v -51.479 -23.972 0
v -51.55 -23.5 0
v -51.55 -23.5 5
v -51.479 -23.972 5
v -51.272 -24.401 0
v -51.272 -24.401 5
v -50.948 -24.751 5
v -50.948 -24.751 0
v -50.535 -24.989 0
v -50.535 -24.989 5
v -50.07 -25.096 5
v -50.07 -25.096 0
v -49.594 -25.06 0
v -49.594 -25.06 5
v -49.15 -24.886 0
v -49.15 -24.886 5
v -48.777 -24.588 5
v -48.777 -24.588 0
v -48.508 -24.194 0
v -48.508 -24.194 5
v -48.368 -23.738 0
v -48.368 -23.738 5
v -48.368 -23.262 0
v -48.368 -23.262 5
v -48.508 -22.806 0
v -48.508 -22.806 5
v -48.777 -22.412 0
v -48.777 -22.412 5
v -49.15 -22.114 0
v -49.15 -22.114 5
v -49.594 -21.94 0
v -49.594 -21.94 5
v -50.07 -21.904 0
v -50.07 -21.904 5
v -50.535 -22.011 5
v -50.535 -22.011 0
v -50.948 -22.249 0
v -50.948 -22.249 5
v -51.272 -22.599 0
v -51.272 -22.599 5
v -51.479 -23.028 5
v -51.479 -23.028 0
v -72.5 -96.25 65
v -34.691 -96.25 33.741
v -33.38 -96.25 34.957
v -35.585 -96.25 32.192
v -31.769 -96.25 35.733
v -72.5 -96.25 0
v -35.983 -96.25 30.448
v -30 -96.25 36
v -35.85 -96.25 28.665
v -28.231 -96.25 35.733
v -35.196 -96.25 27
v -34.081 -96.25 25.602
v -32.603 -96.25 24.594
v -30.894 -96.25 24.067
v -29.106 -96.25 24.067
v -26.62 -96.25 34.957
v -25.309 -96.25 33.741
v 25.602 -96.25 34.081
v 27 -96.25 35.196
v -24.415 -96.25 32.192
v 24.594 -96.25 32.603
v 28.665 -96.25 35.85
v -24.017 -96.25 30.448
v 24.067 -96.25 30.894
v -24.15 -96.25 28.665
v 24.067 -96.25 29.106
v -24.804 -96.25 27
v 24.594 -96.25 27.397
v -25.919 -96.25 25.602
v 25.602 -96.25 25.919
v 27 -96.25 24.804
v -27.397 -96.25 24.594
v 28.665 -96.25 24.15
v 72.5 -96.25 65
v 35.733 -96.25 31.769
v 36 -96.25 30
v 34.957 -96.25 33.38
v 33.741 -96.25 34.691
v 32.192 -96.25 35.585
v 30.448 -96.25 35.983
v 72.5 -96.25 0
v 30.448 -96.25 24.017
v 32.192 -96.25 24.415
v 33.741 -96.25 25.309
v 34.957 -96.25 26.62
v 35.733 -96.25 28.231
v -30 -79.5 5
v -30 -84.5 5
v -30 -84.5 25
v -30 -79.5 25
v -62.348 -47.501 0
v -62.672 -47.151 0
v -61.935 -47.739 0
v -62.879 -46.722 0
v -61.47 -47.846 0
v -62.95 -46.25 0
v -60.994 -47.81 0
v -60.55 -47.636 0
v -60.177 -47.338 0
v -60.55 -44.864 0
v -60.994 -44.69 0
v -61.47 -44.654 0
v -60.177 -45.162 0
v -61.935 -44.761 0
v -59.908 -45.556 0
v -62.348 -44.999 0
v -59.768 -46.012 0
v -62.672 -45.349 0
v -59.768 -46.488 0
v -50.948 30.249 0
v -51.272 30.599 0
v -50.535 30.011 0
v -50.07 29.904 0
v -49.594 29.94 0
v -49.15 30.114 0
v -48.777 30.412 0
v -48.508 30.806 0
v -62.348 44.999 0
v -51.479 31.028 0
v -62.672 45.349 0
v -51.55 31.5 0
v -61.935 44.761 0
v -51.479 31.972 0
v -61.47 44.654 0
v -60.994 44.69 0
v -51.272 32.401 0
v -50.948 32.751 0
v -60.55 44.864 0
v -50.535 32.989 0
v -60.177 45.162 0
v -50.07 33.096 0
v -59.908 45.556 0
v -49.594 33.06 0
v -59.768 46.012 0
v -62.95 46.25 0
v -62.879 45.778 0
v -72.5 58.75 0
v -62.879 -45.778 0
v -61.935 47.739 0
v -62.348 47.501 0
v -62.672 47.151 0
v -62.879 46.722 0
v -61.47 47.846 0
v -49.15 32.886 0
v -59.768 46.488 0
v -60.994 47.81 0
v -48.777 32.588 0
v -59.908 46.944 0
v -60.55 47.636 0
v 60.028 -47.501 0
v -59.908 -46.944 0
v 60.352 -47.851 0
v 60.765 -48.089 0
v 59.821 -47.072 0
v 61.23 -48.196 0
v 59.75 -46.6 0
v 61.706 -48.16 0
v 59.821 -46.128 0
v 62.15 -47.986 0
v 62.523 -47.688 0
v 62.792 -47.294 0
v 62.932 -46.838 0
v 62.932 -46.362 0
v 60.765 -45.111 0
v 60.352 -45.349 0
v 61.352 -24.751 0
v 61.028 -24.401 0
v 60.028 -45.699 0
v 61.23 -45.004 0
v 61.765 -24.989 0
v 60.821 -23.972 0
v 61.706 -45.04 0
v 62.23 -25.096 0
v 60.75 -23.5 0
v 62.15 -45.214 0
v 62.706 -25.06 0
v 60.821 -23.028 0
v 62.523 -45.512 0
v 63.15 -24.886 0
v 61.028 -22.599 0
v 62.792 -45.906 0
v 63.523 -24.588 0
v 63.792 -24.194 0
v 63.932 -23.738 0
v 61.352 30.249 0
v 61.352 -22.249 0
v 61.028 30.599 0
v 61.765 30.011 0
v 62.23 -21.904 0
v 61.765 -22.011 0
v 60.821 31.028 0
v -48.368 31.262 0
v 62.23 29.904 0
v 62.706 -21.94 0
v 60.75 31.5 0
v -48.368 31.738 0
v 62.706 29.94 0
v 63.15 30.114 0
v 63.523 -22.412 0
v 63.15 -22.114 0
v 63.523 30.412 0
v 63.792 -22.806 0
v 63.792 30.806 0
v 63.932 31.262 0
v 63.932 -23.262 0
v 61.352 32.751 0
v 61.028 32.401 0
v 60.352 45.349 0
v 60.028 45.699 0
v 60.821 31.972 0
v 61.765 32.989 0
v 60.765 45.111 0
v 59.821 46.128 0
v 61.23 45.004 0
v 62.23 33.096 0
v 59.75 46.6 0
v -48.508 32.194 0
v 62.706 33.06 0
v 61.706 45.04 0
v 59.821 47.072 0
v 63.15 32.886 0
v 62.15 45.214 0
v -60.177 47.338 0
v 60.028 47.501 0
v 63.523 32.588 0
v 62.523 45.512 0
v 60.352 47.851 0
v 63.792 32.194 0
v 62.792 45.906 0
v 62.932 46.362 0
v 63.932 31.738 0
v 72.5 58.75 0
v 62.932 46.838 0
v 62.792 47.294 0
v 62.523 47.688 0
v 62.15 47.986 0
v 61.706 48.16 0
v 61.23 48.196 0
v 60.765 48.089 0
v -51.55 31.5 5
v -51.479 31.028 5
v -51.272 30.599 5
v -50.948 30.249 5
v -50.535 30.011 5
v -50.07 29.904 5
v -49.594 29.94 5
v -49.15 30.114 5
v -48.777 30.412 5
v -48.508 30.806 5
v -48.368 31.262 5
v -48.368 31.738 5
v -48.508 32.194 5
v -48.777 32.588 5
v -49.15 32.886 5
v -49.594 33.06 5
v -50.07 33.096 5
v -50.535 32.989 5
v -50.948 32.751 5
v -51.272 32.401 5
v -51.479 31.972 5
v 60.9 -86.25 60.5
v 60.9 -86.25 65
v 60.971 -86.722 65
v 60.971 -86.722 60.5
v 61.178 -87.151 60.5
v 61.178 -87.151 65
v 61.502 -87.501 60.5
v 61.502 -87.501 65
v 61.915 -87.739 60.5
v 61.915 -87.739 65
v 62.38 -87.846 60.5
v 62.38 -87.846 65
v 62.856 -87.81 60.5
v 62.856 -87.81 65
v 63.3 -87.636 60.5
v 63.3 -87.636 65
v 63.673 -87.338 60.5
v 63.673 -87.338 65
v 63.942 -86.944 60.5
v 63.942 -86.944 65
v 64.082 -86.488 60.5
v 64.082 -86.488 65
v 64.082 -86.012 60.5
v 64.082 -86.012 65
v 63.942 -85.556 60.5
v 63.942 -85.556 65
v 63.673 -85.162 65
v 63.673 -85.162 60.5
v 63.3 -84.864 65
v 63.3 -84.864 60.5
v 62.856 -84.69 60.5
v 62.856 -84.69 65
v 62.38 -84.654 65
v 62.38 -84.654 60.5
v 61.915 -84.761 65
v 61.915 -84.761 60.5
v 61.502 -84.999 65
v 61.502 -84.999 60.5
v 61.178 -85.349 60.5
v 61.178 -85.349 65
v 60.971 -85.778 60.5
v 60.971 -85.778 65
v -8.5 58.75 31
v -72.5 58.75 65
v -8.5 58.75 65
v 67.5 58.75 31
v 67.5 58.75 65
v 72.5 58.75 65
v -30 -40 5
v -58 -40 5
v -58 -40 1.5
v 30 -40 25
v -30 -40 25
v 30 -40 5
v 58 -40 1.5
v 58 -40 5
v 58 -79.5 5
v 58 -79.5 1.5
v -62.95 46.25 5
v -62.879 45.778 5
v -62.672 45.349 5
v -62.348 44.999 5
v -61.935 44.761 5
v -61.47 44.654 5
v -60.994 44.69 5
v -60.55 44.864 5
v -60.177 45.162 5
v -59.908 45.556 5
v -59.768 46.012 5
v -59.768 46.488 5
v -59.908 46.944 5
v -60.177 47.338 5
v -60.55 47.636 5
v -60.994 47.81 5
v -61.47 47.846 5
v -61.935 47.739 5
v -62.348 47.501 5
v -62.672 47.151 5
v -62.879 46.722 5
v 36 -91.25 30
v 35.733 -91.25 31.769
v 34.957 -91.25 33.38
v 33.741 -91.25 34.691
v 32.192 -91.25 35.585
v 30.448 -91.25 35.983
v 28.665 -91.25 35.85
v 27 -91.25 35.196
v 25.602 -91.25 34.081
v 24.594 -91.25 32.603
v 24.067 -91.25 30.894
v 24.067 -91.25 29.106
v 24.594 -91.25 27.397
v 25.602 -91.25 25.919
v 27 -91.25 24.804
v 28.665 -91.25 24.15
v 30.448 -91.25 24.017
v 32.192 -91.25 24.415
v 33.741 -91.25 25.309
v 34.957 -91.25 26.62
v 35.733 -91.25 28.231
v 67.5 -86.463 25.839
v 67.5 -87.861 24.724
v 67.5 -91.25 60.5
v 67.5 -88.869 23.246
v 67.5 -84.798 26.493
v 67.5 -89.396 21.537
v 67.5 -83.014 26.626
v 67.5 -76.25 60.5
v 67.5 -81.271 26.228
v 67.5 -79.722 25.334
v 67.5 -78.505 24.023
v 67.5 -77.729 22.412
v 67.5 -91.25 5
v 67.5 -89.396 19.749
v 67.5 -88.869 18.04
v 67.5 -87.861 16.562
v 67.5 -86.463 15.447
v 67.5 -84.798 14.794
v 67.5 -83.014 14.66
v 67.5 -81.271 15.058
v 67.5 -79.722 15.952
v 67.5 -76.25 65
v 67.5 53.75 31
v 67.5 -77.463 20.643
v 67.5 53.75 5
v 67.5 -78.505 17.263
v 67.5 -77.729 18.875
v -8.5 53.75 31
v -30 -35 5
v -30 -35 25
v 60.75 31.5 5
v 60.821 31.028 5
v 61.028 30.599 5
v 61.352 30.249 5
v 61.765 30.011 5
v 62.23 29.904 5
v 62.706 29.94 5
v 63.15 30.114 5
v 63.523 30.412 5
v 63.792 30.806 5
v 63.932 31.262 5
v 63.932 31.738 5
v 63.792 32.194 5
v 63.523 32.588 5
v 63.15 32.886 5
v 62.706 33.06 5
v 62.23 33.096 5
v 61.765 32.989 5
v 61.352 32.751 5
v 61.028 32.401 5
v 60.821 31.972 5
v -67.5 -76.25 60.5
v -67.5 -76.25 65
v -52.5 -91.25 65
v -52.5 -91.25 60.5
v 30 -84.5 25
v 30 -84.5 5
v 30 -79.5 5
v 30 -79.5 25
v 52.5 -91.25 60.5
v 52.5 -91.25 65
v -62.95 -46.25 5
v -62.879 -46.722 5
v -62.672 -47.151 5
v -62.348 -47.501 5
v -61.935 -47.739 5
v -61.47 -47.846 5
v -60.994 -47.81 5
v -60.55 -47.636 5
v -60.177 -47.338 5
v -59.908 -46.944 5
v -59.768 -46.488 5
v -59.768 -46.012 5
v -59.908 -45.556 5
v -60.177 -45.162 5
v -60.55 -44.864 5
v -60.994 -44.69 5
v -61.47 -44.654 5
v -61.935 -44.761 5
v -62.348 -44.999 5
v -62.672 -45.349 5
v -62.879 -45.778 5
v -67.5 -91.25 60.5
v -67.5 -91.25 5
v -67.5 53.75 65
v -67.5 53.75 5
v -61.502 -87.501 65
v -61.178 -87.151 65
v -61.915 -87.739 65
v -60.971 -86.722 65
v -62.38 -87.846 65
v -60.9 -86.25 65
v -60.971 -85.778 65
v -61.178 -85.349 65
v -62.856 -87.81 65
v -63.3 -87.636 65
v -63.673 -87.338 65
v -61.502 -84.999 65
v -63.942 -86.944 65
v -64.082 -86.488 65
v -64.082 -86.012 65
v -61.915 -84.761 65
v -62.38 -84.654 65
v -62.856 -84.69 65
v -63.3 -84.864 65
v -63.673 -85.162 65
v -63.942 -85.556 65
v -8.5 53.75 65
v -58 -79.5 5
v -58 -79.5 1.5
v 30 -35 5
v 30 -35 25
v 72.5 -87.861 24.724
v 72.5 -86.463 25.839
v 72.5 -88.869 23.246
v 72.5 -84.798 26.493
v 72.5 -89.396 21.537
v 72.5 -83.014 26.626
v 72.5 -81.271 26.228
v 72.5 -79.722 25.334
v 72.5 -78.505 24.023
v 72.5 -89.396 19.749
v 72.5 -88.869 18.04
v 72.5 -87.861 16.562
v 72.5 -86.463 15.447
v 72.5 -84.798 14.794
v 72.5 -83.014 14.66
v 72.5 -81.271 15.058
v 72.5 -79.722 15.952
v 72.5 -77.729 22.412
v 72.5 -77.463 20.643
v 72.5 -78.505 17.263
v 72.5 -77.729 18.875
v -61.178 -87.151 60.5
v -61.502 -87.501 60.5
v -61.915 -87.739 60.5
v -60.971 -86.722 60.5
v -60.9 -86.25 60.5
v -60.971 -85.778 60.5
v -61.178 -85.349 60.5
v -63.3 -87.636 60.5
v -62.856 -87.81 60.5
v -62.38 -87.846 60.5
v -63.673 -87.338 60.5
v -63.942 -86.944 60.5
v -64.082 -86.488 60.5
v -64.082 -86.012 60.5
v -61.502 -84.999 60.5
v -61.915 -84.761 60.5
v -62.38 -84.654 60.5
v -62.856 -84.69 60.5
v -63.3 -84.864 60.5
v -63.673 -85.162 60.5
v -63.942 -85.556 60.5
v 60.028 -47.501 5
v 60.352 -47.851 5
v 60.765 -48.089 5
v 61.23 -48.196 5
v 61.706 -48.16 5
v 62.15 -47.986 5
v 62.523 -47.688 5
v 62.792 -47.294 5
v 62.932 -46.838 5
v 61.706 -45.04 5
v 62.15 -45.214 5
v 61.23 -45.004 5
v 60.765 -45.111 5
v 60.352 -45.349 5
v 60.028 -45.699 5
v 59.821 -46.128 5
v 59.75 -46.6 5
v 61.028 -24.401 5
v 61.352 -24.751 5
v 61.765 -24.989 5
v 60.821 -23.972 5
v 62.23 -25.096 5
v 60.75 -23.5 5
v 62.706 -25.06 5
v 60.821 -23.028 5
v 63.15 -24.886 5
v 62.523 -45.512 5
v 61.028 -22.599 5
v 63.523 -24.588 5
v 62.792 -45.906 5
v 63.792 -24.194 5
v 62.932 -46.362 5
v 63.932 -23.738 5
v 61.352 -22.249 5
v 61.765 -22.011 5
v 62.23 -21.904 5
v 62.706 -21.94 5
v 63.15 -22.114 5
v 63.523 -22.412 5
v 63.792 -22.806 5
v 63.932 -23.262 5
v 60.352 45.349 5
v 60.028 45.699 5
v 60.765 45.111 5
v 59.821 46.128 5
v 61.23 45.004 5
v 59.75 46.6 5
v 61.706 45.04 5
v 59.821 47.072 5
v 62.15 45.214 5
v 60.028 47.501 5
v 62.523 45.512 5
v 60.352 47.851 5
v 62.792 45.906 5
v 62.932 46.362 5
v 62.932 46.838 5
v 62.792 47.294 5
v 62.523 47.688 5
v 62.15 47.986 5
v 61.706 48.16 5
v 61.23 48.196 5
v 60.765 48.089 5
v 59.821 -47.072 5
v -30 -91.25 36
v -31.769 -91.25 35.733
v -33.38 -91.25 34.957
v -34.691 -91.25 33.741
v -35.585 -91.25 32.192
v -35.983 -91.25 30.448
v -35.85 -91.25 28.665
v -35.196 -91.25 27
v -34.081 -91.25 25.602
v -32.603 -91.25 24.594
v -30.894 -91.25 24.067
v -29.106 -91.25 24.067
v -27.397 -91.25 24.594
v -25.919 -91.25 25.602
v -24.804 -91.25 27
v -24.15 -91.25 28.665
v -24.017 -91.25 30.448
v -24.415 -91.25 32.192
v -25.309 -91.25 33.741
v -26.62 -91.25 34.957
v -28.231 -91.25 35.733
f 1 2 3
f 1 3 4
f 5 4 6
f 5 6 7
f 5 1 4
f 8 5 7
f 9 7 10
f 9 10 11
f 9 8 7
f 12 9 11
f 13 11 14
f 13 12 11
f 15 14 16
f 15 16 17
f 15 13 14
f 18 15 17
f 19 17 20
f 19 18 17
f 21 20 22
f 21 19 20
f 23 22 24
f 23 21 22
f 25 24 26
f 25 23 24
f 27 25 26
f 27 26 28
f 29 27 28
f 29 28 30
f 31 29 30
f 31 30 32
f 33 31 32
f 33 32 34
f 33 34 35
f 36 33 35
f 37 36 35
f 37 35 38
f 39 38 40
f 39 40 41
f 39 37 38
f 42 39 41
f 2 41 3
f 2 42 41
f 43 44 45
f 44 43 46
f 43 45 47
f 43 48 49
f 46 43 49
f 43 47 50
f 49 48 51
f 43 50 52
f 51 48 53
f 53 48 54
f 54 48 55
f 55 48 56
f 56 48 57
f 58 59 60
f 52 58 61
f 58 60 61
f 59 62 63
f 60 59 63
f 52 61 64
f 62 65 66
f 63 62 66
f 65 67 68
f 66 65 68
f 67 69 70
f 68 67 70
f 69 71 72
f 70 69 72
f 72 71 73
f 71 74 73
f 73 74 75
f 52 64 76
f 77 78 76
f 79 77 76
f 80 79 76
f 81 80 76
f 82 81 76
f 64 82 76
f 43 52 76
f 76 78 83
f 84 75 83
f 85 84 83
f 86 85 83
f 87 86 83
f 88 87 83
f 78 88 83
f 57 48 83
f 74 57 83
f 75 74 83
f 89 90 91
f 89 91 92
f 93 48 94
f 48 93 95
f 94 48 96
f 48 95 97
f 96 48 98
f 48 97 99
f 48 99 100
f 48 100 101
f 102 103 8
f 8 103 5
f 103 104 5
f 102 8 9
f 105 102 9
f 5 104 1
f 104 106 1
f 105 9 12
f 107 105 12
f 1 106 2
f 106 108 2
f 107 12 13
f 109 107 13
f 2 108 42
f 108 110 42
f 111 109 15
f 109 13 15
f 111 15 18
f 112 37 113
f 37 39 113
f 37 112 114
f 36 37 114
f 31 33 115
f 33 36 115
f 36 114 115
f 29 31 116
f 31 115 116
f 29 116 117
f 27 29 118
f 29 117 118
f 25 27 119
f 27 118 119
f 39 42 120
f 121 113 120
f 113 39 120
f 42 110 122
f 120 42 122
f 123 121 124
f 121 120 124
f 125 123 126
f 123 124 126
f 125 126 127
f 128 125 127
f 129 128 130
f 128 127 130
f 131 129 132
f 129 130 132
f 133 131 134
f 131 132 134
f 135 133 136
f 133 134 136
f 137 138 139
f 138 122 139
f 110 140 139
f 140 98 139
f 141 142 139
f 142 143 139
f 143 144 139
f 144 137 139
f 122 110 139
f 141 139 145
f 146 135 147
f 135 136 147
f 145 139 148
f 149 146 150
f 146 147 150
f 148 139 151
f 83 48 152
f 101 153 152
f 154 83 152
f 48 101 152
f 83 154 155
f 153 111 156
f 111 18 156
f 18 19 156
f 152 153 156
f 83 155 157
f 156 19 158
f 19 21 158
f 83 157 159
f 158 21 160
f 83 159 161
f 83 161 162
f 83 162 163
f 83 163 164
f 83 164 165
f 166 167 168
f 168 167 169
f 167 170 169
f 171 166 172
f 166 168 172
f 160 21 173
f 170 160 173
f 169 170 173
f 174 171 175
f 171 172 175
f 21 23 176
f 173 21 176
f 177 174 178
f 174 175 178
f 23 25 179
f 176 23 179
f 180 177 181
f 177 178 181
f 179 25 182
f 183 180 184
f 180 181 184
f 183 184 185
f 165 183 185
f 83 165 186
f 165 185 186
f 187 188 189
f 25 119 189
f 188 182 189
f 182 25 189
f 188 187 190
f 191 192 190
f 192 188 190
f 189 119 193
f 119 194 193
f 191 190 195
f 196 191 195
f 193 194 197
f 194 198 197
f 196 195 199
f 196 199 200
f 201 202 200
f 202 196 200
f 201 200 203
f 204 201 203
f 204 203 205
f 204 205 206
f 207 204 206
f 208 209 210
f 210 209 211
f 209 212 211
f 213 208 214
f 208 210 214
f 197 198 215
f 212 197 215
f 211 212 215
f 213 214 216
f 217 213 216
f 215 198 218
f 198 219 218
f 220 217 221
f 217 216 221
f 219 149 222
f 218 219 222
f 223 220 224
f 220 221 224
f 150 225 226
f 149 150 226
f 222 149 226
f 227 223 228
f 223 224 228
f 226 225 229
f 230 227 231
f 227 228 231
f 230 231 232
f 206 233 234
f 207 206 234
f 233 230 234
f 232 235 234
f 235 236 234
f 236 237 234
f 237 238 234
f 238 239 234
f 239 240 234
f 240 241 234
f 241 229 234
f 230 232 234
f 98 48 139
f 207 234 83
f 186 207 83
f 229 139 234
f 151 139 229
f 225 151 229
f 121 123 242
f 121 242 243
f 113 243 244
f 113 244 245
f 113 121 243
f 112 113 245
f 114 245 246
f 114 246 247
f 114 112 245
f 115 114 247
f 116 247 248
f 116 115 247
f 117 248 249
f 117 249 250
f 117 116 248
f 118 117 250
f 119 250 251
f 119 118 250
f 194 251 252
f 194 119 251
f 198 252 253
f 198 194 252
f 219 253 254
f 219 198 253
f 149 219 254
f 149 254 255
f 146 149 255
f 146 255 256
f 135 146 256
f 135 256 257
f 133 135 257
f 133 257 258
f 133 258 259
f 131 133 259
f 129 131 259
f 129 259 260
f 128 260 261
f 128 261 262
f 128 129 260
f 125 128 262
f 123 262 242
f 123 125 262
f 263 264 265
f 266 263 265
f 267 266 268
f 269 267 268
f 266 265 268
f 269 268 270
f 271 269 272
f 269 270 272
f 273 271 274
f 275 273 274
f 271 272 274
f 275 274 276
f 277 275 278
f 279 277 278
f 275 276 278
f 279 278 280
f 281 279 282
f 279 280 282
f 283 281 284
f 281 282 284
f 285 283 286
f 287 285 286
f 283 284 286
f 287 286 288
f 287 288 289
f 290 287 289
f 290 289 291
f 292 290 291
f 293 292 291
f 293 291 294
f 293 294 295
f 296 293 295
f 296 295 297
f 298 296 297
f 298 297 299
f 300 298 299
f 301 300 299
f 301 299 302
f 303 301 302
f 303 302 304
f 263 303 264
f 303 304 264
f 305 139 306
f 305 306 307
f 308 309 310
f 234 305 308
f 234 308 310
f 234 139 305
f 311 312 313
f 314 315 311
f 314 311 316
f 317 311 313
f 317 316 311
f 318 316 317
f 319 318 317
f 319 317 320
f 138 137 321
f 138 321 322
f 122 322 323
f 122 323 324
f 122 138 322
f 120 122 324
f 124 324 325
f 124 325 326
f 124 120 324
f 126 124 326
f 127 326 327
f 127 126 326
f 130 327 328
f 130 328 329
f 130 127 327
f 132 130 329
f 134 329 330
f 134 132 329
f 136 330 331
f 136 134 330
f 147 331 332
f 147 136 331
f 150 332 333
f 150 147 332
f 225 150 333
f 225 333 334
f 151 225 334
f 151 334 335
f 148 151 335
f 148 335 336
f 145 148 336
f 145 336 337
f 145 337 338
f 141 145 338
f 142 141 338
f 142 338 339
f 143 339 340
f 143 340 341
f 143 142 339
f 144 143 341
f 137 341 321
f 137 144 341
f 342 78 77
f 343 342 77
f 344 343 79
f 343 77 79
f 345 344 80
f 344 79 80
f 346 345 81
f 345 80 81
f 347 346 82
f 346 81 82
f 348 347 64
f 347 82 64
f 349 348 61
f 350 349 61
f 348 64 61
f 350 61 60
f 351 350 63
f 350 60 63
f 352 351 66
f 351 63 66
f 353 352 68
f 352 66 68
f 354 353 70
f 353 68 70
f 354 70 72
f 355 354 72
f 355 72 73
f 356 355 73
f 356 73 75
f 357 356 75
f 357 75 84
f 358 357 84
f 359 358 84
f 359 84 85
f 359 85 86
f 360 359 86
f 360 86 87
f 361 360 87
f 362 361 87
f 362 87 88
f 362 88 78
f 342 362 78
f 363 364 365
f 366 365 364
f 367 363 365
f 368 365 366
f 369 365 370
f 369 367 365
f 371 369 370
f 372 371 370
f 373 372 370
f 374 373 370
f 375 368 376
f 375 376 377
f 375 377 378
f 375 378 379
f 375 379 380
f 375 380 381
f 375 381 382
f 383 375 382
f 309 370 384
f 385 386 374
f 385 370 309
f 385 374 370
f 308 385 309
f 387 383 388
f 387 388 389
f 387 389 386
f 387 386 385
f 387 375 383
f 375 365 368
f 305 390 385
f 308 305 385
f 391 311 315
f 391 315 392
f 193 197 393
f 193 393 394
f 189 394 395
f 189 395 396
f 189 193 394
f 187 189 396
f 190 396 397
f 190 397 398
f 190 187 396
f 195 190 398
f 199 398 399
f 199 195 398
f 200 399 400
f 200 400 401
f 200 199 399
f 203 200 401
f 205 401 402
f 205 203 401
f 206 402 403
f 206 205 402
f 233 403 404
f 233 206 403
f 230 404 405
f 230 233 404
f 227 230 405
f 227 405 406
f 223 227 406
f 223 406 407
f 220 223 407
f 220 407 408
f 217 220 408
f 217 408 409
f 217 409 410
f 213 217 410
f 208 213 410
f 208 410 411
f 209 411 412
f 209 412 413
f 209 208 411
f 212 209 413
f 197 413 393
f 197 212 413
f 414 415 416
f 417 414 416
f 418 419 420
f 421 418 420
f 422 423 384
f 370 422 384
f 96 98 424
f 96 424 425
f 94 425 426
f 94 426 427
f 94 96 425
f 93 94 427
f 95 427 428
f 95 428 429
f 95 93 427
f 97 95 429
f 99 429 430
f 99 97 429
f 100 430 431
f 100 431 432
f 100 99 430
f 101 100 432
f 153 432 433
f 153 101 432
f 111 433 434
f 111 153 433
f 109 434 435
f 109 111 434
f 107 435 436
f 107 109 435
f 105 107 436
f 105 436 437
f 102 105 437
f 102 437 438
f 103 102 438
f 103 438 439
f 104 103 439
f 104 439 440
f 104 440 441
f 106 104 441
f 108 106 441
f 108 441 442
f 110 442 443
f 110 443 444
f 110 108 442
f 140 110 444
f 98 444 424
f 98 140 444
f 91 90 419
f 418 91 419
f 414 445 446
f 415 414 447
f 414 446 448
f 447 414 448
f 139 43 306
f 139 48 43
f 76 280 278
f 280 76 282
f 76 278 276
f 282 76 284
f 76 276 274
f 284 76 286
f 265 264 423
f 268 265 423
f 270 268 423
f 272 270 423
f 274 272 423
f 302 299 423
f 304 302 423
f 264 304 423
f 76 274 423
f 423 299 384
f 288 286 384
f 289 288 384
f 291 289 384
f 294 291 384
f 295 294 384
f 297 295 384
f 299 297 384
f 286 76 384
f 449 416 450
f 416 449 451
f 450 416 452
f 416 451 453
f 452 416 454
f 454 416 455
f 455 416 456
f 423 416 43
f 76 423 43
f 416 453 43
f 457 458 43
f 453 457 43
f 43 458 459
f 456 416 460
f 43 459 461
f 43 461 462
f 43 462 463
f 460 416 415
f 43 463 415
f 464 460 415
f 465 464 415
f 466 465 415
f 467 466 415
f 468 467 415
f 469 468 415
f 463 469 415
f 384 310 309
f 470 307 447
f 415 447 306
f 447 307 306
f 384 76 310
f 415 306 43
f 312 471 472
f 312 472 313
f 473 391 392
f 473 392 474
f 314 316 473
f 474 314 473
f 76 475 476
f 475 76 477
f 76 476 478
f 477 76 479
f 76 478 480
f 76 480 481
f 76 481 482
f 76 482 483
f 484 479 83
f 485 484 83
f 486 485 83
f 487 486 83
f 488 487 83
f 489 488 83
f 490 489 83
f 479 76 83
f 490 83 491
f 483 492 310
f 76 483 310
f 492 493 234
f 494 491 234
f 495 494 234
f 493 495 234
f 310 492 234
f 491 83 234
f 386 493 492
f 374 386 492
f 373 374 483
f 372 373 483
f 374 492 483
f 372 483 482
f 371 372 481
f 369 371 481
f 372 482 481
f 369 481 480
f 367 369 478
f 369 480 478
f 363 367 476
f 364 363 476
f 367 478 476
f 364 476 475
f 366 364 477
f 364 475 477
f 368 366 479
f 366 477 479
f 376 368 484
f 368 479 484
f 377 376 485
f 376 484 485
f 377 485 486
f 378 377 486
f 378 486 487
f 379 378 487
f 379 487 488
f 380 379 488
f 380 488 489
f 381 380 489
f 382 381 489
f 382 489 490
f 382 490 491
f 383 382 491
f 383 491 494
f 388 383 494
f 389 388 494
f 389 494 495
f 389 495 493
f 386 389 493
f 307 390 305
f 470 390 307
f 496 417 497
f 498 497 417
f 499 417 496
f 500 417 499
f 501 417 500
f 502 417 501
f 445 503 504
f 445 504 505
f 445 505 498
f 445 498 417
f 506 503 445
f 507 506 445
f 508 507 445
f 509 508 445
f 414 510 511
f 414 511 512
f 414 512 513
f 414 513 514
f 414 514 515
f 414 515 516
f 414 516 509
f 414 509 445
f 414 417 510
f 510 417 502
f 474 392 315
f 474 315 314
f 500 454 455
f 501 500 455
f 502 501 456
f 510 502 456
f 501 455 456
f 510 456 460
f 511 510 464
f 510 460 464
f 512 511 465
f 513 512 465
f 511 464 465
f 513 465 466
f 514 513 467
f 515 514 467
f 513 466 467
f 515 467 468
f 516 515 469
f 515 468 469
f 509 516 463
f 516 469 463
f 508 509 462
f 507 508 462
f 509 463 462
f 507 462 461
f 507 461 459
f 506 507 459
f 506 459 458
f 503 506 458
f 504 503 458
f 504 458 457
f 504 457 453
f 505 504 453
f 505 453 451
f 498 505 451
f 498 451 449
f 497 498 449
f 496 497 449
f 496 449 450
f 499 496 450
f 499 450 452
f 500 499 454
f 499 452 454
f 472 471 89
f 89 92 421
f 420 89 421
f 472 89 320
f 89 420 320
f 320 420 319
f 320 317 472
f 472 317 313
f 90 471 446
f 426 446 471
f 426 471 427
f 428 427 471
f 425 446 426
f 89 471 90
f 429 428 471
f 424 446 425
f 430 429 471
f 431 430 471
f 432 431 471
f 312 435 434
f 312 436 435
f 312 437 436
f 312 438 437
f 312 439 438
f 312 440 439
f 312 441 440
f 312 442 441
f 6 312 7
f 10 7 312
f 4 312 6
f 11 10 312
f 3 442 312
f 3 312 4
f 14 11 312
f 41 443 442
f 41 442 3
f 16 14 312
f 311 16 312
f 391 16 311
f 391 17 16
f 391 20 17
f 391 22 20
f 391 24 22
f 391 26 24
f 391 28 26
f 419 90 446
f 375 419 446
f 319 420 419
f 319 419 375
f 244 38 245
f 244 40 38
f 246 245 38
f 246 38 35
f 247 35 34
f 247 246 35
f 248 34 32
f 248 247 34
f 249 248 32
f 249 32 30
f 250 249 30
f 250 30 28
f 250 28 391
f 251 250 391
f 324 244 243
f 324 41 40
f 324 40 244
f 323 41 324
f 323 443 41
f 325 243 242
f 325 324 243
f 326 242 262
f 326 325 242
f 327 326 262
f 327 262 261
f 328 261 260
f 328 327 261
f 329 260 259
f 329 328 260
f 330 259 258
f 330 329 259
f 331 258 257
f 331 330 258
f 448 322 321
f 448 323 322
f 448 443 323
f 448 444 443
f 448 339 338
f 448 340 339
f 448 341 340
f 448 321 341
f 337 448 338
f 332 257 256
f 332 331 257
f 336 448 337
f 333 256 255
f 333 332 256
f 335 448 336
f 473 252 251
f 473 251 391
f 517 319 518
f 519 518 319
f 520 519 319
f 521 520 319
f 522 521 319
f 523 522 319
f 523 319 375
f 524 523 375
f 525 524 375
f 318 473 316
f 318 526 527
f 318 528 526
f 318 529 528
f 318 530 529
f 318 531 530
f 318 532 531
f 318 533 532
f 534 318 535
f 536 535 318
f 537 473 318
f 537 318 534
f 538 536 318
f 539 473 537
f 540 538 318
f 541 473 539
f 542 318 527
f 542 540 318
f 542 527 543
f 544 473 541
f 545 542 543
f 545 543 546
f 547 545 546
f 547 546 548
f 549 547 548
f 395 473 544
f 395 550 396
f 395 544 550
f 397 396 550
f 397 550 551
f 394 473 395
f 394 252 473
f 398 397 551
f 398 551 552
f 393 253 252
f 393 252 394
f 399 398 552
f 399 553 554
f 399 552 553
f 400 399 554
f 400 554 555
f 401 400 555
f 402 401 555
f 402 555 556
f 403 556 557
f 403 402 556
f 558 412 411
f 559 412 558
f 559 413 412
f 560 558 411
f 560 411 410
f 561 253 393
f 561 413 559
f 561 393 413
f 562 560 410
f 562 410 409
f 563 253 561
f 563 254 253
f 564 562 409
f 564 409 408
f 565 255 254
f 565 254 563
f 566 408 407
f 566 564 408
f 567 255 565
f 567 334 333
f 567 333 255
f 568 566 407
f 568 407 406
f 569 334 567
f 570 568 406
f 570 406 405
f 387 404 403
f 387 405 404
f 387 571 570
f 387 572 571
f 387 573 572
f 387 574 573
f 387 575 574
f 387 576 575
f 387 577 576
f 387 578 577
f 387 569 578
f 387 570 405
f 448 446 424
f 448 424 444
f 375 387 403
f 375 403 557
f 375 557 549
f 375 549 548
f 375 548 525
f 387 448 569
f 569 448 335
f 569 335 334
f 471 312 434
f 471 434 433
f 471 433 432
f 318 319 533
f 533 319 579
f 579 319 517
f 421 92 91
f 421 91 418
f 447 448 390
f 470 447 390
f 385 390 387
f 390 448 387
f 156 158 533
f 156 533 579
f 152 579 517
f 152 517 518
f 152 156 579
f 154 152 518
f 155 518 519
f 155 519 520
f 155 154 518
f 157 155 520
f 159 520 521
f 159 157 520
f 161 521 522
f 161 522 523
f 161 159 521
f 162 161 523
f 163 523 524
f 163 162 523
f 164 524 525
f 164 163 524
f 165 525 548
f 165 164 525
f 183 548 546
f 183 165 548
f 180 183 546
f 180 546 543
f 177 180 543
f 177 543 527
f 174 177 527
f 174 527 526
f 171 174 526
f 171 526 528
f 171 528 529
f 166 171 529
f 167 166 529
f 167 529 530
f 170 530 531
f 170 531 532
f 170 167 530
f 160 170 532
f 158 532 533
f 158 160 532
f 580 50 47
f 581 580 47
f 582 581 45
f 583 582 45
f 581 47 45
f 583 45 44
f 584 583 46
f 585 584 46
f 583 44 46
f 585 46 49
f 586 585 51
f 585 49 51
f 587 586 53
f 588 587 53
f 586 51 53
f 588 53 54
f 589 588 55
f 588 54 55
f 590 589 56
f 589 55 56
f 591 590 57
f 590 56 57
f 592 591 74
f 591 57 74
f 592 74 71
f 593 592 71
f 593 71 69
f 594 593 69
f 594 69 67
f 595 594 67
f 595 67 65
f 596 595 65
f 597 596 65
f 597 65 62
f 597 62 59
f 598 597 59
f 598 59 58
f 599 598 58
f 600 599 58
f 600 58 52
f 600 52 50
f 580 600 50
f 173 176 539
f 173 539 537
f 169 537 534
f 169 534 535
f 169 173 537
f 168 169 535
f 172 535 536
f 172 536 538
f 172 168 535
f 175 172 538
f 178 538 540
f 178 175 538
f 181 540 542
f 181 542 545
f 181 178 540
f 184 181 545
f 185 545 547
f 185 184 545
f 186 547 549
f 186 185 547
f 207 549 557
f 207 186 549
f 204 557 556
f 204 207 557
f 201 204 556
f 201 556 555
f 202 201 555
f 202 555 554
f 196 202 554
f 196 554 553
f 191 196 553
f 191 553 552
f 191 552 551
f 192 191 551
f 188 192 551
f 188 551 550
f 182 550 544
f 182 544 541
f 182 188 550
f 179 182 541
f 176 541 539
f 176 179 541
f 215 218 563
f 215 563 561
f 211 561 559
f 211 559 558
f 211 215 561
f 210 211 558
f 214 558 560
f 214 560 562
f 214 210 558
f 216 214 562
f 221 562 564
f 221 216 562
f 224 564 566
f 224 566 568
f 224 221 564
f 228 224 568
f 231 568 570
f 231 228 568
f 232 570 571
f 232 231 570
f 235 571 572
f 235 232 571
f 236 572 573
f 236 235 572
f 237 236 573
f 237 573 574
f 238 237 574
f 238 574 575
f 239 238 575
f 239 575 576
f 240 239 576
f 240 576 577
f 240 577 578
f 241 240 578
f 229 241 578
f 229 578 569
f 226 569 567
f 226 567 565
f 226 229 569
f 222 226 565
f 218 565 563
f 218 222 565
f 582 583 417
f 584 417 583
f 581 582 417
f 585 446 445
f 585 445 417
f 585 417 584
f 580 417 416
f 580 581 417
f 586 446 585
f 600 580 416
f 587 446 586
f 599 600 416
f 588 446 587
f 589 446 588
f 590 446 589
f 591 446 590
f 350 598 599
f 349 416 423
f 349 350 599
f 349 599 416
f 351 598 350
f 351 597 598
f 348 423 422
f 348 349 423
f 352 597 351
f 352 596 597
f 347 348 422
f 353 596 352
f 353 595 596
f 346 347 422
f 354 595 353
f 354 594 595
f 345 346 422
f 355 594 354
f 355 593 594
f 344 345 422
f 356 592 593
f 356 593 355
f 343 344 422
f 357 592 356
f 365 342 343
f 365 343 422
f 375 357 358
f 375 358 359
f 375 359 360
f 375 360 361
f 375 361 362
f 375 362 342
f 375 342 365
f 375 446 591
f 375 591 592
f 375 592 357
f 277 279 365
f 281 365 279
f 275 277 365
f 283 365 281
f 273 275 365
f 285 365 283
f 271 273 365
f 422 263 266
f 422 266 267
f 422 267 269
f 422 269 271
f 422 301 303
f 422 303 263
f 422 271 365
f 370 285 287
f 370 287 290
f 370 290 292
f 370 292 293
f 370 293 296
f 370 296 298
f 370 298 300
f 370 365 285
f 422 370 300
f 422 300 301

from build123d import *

# Parameters (mm, degrees)
SKETCH_1_W          = 145
SKETCH_1_H          = 155
SKETCH_1_R          = 1.6
EXTRUDE_1_DEPTH     = 5
SKETCH_2_W          = 60
SKETCH_2_H          = 5
EXTRUDE_2_DEPTH     = 20
SKETCH_3_W          = 145
SKETCH_3_H          = 155
SKETCH_3_W_2        = 135
SKETCH_3_H_2        = 145
EXTRUDE_3_DEPTH     = 60
SKETCH_8_R          = 1.6
EXTRUDE_7_DEPTH     = 4.5
SKETCH_9_W          = 76
SKETCH_9_H          = 90
CUT_EXTRUDE_1_DEPTH = 10
CUT_EXTRUDE_2_DEPTH = 3.5
SKETCH_14_R         = 6
CUT_EXTRUDE_3_DEPTH = 10
SKETCH_15_R         = 6
CUT_EXTRUDE_4_DEPTH = 10


with BuildPart() as part:
    # 草图1 → 凸台-拉伸1 (new body)
    with BuildSketch(Plane.XY):
        with Locations((0, -18.75)):
            Rectangle(SKETCH_1_W, SKETCH_1_H)
        with Locations(Location((-61.35, 46.25, 0), (0, 0, 180))):
            Circle(SKETCH_1_R, mode=Mode.SUBTRACT)
        with Locations(Location((61.35, -46.6, 0), (0, 0, 180))):
            Circle(SKETCH_1_R, mode=Mode.SUBTRACT)
        with Locations(Location((61.35, 46.6, 0), (0, 0, 180))):
            Circle(SKETCH_1_R, mode=Mode.SUBTRACT)
        with Locations(Location((-61.35, -46.25, 0), (0, 0, 180))):
            Circle(SKETCH_1_R, mode=Mode.SUBTRACT)
        with Locations(Location((62.35, 31.5, 0), (0, 0, 180))):
            Circle(SKETCH_1_R, mode=Mode.SUBTRACT)
        with Locations(Location((62.35, -23.5, 0), (0, 0, 180))):
            Circle(SKETCH_1_R, mode=Mode.SUBTRACT)
        with Locations(Location((-49.95, 31.5, 0), (0, 0, 180))):
            Circle(SKETCH_1_R, mode=Mode.SUBTRACT)
        with Locations(Location((-49.95, -23.5, 0), (0, 0, 180))):
            Circle(SKETCH_1_R, mode=Mode.SUBTRACT)
    extrude(amount=EXTRUDE_1_DEPTH)

    # 草图2 → 凸台-拉伸2 (add)
    with BuildSketch(Plane.XY.offset(5)):
        with Locations((0, -37.5)):
            Rectangle(SKETCH_2_W, SKETCH_2_H)
        with Locations((0, -82)):
            Rectangle(SKETCH_2_W, SKETCH_2_H)
    extrude(amount=EXTRUDE_2_DEPTH)

    # 草图3 → 凸台-拉伸3 (add)
    with BuildSketch(Plane.XY.offset(5)):
        with Locations((0, -18.75)):
            Rectangle(SKETCH_3_W, SKETCH_3_H)
        with Locations((0, -18.75)):
            Rectangle(SKETCH_3_W_2, SKETCH_3_H_2, mode=Mode.SUBTRACT)
    extrude(amount=EXTRUDE_3_DEPTH)

    # 草图8 → 凸台-拉伸7 (add)
    # profile 1 of 2: a face of its own
    with BuildSketch(Plane.XY.offset(65)):
        Polygon((-67.5, -76.25), (-52.5, -91.25), (-67.5, -91.25), align=None)
        with Locations((-62.5, -86.25)):
            Circle(SKETCH_8_R, mode=Mode.SUBTRACT)
    # profile 2 of 2: a face of its own
    with BuildSketch(Plane.XY.offset(65)):
        Polygon((67.5, -91.25), (52.5, -91.25), (67.5, -76.25), align=None)
        with Locations(Location((62.5, -86.25, 0), (0, 0, 180))):
            Circle(SKETCH_8_R, mode=Mode.SUBTRACT)
    extrude(amount=-EXTRUDE_7_DEPTH)

    # 草图9 → 切除-拉伸1 (cut)
    with BuildSketch(Plane.XZ.offset(-53.75)):
        with Locations((29.5, 76)):
            Rectangle(SKETCH_9_W, SKETCH_9_H)
    extrude(amount=-CUT_EXTRUDE_1_DEPTH, mode=Mode.SUBTRACT)

    # 草图13 → 切除-拉伸2 (cut)
    with BuildSketch(Plane.XY.offset(5)):
        Polygon((-30, -79.5), (-58, -79.5), (-58, -40), (58, -40), (58, -79.5), align=None)
    extrude(amount=-CUT_EXTRUDE_2_DEPTH, mode=Mode.SUBTRACT)

    # 草图14 → 切除-拉伸3 (cut)
    with BuildSketch(Plane(origin=(72.5, 0, 0), x_dir=(0, 0, -1), z_dir=(1, 0, 0))):
        with Locations(Location((-20.643106149, -83.462816737, 0), (0, 0, 90))):
            Circle(SKETCH_14_R)
    extrude(amount=-CUT_EXTRUDE_3_DEPTH, mode=Mode.SUBTRACT)

    # 草图15 → 切除-拉伸4 (cut)
    with BuildSketch(Plane(origin=(0, -96.25, 0), x_dir=(-1, 0, 0), z_dir=(0, -1, 0))):
        with Locations(Location((-30, -30, 0), (0, 0, 180))):
            Circle(SKETCH_15_R)
        with Locations(Location((30, -30, 0), (0, 0, 270))):
            Circle(SKETCH_15_R)
    extrude(amount=-CUT_EXTRUDE_4_DEPTH, mode=Mode.SUBTRACT)


solid = part.part
